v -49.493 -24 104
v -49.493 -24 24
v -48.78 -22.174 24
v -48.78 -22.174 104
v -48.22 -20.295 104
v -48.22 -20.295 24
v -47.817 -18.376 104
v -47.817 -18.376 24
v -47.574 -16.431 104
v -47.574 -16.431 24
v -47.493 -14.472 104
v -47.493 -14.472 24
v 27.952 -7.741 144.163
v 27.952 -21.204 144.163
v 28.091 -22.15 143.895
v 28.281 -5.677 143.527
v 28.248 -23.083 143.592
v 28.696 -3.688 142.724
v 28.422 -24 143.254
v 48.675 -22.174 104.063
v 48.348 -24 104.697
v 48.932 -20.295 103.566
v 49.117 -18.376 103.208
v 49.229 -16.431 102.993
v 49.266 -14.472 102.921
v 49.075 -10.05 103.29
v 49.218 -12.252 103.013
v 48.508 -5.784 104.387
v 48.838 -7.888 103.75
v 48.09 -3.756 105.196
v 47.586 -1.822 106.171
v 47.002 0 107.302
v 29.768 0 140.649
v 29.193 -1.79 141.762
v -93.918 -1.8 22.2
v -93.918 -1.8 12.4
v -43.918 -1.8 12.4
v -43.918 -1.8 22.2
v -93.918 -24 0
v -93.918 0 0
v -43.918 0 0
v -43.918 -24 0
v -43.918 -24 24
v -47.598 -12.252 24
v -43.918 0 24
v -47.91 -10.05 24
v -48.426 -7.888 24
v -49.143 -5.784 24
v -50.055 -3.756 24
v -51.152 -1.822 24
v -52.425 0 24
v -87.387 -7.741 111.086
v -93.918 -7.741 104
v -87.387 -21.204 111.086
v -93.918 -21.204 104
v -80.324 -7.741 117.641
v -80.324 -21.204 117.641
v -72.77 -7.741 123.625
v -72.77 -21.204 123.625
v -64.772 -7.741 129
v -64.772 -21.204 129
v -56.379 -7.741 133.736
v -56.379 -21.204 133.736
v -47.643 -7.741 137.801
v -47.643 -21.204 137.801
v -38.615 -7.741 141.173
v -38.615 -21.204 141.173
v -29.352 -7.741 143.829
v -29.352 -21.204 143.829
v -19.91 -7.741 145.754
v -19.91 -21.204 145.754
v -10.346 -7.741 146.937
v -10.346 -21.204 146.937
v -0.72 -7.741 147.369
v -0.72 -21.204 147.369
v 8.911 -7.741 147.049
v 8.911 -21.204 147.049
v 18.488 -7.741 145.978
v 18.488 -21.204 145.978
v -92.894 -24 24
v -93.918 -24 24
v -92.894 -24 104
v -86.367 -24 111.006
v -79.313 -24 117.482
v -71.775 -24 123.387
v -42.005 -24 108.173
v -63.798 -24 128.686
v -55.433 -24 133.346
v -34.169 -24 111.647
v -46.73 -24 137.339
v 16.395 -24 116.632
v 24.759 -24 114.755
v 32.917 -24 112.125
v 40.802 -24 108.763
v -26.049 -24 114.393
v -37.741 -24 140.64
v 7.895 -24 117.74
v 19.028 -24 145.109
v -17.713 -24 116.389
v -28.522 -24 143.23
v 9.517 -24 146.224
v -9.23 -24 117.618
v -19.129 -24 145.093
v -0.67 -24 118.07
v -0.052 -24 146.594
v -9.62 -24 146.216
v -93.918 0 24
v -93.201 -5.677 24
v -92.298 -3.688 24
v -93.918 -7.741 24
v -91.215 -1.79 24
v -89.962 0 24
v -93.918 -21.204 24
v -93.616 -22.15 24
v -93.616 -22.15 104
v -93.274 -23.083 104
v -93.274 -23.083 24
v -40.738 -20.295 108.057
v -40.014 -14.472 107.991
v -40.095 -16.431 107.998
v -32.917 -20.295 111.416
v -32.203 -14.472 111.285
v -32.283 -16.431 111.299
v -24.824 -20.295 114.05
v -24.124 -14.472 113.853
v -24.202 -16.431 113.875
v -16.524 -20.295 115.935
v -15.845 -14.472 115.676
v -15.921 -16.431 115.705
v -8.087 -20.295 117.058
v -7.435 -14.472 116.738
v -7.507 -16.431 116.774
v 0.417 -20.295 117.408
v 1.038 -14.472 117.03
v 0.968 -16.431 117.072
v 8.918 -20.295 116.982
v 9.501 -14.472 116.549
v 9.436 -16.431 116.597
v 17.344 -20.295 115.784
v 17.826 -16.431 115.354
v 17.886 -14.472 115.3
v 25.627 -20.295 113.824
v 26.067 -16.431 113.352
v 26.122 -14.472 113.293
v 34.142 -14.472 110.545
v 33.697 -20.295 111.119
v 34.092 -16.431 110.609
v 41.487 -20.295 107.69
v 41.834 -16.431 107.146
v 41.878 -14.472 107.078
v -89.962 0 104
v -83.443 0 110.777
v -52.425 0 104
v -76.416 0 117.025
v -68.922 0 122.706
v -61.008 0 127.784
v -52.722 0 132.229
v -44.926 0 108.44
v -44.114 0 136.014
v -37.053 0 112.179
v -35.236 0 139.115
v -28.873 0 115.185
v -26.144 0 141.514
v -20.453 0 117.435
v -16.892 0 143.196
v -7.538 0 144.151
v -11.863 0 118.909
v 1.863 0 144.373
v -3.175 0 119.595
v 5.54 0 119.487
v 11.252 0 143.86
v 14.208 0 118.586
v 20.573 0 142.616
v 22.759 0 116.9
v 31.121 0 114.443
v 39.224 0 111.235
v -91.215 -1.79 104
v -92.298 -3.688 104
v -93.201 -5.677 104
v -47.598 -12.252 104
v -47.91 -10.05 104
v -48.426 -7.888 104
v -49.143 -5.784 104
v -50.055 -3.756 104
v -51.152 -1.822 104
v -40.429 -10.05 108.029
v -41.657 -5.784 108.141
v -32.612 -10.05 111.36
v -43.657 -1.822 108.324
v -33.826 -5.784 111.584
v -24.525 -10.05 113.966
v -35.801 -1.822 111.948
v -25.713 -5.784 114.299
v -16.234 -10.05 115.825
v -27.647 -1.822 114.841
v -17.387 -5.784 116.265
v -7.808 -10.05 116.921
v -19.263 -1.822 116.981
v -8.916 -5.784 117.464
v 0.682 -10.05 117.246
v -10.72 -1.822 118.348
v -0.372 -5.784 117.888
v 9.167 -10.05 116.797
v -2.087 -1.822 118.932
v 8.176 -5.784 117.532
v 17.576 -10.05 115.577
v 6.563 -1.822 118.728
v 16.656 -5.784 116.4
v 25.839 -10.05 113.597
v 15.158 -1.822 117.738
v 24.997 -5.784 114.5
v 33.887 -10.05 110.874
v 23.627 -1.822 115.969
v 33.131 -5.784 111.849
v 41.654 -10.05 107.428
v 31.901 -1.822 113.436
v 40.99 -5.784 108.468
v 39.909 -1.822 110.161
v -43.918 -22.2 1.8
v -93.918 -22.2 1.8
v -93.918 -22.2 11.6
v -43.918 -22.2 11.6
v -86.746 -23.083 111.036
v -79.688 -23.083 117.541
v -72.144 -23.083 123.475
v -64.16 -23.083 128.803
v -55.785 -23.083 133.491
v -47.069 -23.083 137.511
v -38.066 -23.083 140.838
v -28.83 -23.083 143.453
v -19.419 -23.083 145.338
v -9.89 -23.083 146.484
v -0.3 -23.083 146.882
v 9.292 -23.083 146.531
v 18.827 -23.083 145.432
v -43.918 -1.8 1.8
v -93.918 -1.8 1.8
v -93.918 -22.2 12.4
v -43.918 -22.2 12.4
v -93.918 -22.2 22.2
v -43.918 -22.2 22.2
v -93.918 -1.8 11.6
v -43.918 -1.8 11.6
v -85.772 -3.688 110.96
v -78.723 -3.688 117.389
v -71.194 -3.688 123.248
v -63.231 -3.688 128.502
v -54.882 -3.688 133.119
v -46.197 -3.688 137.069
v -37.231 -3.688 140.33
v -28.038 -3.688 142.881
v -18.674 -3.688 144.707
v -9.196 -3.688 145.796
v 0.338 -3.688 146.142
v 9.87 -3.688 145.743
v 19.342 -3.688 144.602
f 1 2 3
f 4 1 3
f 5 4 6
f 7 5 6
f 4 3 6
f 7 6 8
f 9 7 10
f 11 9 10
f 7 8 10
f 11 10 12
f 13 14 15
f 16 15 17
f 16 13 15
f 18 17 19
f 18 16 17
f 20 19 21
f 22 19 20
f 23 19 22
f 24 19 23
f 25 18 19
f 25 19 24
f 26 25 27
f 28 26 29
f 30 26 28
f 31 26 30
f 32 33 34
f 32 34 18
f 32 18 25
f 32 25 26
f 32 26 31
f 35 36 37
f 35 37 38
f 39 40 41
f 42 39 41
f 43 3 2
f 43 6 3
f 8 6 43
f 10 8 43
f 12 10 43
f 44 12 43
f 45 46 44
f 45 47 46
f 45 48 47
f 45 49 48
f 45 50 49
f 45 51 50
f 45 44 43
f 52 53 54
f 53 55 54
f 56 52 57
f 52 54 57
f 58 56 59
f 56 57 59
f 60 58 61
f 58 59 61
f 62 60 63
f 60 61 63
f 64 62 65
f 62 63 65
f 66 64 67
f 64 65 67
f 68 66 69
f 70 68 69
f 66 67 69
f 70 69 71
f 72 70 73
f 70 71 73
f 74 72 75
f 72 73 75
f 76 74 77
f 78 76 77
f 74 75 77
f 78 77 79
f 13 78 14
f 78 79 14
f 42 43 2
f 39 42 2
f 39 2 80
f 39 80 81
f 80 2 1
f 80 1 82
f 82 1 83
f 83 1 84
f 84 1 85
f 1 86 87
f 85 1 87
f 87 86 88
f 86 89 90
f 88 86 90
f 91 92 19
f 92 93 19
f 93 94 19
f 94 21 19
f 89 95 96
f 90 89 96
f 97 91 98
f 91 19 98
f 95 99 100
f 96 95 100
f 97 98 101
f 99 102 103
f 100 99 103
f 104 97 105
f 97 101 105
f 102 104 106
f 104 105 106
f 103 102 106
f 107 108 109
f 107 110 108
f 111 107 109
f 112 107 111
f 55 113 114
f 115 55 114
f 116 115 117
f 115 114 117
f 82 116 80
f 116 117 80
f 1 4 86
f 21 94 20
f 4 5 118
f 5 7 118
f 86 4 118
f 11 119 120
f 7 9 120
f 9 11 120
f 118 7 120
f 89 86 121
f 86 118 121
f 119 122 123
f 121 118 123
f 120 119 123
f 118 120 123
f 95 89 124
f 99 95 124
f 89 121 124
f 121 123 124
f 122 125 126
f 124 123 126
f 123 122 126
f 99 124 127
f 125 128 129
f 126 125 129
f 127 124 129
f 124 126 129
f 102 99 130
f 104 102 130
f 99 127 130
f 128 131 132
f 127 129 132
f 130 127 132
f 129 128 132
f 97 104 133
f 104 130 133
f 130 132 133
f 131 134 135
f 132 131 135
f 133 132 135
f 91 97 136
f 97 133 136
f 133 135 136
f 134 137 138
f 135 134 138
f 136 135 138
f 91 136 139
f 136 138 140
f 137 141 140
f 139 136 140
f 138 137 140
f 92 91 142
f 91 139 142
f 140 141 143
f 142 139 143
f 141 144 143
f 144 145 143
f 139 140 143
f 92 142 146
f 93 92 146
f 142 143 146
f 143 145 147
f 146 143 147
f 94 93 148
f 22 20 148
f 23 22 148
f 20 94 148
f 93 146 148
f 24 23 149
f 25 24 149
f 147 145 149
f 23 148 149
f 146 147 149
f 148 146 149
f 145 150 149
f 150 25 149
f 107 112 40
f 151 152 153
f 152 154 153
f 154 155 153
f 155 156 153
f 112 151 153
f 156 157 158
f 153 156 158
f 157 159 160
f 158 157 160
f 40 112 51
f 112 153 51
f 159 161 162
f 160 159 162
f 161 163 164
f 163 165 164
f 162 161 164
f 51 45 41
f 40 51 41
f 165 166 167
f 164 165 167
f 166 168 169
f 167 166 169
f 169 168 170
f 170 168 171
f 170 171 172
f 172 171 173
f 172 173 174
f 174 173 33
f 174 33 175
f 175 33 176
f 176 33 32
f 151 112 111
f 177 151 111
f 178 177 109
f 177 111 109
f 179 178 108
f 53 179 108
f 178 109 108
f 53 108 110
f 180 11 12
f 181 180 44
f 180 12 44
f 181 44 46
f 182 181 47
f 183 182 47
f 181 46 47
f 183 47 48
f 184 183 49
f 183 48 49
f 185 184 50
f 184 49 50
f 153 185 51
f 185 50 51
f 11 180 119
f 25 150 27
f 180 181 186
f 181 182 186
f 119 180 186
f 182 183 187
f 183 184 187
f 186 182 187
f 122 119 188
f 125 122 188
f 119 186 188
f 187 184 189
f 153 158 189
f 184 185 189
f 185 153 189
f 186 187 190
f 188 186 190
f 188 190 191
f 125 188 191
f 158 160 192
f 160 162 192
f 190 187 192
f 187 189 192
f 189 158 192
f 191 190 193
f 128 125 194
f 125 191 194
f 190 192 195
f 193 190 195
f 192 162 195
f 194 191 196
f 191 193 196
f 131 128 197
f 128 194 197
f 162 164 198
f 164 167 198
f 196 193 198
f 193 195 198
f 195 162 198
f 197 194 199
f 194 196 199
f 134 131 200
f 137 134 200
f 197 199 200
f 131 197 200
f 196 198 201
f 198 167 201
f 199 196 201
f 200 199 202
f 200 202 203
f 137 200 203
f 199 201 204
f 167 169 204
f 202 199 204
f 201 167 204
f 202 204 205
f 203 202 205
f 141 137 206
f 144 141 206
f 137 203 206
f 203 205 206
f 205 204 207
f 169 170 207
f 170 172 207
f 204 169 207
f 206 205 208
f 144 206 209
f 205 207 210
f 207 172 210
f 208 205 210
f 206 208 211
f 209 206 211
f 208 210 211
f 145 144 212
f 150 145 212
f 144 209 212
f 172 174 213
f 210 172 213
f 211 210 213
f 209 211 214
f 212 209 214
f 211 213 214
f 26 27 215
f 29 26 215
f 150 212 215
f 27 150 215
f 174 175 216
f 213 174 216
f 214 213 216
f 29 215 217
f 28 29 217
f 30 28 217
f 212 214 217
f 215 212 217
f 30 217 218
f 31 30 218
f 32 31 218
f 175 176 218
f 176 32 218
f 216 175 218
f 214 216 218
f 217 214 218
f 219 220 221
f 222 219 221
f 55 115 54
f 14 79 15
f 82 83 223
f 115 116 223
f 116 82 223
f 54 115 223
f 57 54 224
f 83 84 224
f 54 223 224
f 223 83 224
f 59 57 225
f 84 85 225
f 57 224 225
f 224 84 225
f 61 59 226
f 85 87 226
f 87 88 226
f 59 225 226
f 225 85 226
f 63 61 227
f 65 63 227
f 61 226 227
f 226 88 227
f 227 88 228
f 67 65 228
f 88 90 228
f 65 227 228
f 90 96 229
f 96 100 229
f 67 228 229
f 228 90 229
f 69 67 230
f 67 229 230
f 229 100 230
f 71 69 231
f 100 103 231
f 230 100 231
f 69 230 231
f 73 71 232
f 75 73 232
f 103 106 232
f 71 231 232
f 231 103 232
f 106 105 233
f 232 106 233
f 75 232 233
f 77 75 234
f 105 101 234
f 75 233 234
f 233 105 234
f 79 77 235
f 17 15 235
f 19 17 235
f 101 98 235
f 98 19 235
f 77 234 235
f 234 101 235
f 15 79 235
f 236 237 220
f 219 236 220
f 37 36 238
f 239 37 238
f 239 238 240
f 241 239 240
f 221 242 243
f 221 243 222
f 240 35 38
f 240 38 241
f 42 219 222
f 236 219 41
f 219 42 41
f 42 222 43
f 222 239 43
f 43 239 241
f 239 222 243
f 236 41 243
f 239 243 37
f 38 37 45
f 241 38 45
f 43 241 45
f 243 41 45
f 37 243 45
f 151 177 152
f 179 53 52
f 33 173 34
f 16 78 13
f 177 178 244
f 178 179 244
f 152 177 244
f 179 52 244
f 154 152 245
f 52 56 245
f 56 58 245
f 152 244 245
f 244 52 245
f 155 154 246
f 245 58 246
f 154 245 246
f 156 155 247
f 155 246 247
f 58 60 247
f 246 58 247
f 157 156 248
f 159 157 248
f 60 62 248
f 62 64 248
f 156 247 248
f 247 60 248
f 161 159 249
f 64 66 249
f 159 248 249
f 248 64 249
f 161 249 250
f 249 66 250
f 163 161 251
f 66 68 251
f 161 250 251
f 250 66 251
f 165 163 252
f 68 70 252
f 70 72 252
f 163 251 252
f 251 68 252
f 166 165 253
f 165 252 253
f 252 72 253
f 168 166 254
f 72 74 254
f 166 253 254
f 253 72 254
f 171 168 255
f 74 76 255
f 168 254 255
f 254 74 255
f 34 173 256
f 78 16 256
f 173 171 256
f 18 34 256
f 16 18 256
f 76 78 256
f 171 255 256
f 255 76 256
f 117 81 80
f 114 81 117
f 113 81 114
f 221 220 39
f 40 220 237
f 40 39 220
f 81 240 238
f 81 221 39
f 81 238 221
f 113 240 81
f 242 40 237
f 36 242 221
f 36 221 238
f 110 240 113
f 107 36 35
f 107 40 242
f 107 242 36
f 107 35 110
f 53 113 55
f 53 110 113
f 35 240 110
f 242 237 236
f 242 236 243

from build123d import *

# Parameters (mm, degrees)
F0_W     = 50
F0_H     = 24
F1_DEPTH = 24
F3_W     = 20.4
F3_H     = 9.8
F4_DEPTH = 50.001
F5_DEPTH = 80
F7_ANGLE = 62.6704880326


with BuildPart() as f1:
    # F0 (on Front) → F1 (new body)
    with BuildSketch(Plane.XZ):
        with Locations((-68.9176678658, 12)):
            Rectangle(F0_W, F0_H)
    extrude(amount=F1_DEPTH)

    # F3 (on face) → F4 (cut, through all)
    with BuildSketch(Plane(origin=(-93.9176678658, 0, 0), x_dir=(0, -1, 0), z_dir=(-1, 0, 0))):
        with Locations((12, 6.7)):
            Rectangle(F3_W, F3_H)
        with Locations((12, 17.3)):
            Rectangle(F3_W, F3_H)
    extrude(amount=-F4_DEPTH, mode=Mode.SUBTRACT)

    # F2 (on face) → F5 (join)
    with BuildSketch(Plane.XY.offset(24)):
        with BuildLine():
            ThreePointArc((-49.4927692396, -24), (-47.9986026074, -19.3399762696), (-47.4933667129, -14.4724212587))
            ThreePointArc((-47.4933667129, -14.4724212587), (-48.7602054242, -6.8275726586), (-52.425289602, 0))
            Line((-52.425289602, 0), (-89.9617876104, 0))
            ThreePointArc((-89.9617876104, 0), (-92.2976878441, -3.6875692563), (-93.9176678658, -7.7409951716))
            Line((-93.9176678658, -7.7409951716), (-93.9176678658, -21.2038473458))
            ThreePointArc((-93.9176678658, -21.2038473458), (-93.4499426711, -22.6180106094), (-92.8943079727, -24))
            Line((-92.8943079727, -24), (-49.4927692396, -24))
        make_face()
    extrude(amount=F5_DEPTH)

    # F6 (on face) → F7 (revolve)
    with BuildSketch(Plane.XY.offset(104)):
        with BuildLine():
            ThreePointArc((-49.4927692396, -24), (-47.9986026074, -19.3399762696), (-47.4933667129, -14.4724212587))
            ThreePointArc((-47.4933667129, -14.4724212587), (-48.7602054242, -6.8275726586), (-52.425289602, 0))
            Line((-52.425289602, 0), (-89.9617876104, 0))
            ThreePointArc((-89.9617876104, 0), (-92.2976878441, -3.6875692563), (-93.9176678658, -7.7409951716))
            Line((-93.9176678658, -7.7409951716), (-93.9176678658, -21.2038473458))
            ThreePointArc((-93.9176678658, -21.2038473458), (-93.4499426711, -22.6180106094), (-92.8943079727, -24))
            Line((-92.8943079727, -24), (-49.4927692396, -24))
        make_face()
    revolve(axis=Axis((0, 2.9759369791, 24), (0, 1, 0)), revolution_arc=F7_ANGLE)


solid = f1.part
